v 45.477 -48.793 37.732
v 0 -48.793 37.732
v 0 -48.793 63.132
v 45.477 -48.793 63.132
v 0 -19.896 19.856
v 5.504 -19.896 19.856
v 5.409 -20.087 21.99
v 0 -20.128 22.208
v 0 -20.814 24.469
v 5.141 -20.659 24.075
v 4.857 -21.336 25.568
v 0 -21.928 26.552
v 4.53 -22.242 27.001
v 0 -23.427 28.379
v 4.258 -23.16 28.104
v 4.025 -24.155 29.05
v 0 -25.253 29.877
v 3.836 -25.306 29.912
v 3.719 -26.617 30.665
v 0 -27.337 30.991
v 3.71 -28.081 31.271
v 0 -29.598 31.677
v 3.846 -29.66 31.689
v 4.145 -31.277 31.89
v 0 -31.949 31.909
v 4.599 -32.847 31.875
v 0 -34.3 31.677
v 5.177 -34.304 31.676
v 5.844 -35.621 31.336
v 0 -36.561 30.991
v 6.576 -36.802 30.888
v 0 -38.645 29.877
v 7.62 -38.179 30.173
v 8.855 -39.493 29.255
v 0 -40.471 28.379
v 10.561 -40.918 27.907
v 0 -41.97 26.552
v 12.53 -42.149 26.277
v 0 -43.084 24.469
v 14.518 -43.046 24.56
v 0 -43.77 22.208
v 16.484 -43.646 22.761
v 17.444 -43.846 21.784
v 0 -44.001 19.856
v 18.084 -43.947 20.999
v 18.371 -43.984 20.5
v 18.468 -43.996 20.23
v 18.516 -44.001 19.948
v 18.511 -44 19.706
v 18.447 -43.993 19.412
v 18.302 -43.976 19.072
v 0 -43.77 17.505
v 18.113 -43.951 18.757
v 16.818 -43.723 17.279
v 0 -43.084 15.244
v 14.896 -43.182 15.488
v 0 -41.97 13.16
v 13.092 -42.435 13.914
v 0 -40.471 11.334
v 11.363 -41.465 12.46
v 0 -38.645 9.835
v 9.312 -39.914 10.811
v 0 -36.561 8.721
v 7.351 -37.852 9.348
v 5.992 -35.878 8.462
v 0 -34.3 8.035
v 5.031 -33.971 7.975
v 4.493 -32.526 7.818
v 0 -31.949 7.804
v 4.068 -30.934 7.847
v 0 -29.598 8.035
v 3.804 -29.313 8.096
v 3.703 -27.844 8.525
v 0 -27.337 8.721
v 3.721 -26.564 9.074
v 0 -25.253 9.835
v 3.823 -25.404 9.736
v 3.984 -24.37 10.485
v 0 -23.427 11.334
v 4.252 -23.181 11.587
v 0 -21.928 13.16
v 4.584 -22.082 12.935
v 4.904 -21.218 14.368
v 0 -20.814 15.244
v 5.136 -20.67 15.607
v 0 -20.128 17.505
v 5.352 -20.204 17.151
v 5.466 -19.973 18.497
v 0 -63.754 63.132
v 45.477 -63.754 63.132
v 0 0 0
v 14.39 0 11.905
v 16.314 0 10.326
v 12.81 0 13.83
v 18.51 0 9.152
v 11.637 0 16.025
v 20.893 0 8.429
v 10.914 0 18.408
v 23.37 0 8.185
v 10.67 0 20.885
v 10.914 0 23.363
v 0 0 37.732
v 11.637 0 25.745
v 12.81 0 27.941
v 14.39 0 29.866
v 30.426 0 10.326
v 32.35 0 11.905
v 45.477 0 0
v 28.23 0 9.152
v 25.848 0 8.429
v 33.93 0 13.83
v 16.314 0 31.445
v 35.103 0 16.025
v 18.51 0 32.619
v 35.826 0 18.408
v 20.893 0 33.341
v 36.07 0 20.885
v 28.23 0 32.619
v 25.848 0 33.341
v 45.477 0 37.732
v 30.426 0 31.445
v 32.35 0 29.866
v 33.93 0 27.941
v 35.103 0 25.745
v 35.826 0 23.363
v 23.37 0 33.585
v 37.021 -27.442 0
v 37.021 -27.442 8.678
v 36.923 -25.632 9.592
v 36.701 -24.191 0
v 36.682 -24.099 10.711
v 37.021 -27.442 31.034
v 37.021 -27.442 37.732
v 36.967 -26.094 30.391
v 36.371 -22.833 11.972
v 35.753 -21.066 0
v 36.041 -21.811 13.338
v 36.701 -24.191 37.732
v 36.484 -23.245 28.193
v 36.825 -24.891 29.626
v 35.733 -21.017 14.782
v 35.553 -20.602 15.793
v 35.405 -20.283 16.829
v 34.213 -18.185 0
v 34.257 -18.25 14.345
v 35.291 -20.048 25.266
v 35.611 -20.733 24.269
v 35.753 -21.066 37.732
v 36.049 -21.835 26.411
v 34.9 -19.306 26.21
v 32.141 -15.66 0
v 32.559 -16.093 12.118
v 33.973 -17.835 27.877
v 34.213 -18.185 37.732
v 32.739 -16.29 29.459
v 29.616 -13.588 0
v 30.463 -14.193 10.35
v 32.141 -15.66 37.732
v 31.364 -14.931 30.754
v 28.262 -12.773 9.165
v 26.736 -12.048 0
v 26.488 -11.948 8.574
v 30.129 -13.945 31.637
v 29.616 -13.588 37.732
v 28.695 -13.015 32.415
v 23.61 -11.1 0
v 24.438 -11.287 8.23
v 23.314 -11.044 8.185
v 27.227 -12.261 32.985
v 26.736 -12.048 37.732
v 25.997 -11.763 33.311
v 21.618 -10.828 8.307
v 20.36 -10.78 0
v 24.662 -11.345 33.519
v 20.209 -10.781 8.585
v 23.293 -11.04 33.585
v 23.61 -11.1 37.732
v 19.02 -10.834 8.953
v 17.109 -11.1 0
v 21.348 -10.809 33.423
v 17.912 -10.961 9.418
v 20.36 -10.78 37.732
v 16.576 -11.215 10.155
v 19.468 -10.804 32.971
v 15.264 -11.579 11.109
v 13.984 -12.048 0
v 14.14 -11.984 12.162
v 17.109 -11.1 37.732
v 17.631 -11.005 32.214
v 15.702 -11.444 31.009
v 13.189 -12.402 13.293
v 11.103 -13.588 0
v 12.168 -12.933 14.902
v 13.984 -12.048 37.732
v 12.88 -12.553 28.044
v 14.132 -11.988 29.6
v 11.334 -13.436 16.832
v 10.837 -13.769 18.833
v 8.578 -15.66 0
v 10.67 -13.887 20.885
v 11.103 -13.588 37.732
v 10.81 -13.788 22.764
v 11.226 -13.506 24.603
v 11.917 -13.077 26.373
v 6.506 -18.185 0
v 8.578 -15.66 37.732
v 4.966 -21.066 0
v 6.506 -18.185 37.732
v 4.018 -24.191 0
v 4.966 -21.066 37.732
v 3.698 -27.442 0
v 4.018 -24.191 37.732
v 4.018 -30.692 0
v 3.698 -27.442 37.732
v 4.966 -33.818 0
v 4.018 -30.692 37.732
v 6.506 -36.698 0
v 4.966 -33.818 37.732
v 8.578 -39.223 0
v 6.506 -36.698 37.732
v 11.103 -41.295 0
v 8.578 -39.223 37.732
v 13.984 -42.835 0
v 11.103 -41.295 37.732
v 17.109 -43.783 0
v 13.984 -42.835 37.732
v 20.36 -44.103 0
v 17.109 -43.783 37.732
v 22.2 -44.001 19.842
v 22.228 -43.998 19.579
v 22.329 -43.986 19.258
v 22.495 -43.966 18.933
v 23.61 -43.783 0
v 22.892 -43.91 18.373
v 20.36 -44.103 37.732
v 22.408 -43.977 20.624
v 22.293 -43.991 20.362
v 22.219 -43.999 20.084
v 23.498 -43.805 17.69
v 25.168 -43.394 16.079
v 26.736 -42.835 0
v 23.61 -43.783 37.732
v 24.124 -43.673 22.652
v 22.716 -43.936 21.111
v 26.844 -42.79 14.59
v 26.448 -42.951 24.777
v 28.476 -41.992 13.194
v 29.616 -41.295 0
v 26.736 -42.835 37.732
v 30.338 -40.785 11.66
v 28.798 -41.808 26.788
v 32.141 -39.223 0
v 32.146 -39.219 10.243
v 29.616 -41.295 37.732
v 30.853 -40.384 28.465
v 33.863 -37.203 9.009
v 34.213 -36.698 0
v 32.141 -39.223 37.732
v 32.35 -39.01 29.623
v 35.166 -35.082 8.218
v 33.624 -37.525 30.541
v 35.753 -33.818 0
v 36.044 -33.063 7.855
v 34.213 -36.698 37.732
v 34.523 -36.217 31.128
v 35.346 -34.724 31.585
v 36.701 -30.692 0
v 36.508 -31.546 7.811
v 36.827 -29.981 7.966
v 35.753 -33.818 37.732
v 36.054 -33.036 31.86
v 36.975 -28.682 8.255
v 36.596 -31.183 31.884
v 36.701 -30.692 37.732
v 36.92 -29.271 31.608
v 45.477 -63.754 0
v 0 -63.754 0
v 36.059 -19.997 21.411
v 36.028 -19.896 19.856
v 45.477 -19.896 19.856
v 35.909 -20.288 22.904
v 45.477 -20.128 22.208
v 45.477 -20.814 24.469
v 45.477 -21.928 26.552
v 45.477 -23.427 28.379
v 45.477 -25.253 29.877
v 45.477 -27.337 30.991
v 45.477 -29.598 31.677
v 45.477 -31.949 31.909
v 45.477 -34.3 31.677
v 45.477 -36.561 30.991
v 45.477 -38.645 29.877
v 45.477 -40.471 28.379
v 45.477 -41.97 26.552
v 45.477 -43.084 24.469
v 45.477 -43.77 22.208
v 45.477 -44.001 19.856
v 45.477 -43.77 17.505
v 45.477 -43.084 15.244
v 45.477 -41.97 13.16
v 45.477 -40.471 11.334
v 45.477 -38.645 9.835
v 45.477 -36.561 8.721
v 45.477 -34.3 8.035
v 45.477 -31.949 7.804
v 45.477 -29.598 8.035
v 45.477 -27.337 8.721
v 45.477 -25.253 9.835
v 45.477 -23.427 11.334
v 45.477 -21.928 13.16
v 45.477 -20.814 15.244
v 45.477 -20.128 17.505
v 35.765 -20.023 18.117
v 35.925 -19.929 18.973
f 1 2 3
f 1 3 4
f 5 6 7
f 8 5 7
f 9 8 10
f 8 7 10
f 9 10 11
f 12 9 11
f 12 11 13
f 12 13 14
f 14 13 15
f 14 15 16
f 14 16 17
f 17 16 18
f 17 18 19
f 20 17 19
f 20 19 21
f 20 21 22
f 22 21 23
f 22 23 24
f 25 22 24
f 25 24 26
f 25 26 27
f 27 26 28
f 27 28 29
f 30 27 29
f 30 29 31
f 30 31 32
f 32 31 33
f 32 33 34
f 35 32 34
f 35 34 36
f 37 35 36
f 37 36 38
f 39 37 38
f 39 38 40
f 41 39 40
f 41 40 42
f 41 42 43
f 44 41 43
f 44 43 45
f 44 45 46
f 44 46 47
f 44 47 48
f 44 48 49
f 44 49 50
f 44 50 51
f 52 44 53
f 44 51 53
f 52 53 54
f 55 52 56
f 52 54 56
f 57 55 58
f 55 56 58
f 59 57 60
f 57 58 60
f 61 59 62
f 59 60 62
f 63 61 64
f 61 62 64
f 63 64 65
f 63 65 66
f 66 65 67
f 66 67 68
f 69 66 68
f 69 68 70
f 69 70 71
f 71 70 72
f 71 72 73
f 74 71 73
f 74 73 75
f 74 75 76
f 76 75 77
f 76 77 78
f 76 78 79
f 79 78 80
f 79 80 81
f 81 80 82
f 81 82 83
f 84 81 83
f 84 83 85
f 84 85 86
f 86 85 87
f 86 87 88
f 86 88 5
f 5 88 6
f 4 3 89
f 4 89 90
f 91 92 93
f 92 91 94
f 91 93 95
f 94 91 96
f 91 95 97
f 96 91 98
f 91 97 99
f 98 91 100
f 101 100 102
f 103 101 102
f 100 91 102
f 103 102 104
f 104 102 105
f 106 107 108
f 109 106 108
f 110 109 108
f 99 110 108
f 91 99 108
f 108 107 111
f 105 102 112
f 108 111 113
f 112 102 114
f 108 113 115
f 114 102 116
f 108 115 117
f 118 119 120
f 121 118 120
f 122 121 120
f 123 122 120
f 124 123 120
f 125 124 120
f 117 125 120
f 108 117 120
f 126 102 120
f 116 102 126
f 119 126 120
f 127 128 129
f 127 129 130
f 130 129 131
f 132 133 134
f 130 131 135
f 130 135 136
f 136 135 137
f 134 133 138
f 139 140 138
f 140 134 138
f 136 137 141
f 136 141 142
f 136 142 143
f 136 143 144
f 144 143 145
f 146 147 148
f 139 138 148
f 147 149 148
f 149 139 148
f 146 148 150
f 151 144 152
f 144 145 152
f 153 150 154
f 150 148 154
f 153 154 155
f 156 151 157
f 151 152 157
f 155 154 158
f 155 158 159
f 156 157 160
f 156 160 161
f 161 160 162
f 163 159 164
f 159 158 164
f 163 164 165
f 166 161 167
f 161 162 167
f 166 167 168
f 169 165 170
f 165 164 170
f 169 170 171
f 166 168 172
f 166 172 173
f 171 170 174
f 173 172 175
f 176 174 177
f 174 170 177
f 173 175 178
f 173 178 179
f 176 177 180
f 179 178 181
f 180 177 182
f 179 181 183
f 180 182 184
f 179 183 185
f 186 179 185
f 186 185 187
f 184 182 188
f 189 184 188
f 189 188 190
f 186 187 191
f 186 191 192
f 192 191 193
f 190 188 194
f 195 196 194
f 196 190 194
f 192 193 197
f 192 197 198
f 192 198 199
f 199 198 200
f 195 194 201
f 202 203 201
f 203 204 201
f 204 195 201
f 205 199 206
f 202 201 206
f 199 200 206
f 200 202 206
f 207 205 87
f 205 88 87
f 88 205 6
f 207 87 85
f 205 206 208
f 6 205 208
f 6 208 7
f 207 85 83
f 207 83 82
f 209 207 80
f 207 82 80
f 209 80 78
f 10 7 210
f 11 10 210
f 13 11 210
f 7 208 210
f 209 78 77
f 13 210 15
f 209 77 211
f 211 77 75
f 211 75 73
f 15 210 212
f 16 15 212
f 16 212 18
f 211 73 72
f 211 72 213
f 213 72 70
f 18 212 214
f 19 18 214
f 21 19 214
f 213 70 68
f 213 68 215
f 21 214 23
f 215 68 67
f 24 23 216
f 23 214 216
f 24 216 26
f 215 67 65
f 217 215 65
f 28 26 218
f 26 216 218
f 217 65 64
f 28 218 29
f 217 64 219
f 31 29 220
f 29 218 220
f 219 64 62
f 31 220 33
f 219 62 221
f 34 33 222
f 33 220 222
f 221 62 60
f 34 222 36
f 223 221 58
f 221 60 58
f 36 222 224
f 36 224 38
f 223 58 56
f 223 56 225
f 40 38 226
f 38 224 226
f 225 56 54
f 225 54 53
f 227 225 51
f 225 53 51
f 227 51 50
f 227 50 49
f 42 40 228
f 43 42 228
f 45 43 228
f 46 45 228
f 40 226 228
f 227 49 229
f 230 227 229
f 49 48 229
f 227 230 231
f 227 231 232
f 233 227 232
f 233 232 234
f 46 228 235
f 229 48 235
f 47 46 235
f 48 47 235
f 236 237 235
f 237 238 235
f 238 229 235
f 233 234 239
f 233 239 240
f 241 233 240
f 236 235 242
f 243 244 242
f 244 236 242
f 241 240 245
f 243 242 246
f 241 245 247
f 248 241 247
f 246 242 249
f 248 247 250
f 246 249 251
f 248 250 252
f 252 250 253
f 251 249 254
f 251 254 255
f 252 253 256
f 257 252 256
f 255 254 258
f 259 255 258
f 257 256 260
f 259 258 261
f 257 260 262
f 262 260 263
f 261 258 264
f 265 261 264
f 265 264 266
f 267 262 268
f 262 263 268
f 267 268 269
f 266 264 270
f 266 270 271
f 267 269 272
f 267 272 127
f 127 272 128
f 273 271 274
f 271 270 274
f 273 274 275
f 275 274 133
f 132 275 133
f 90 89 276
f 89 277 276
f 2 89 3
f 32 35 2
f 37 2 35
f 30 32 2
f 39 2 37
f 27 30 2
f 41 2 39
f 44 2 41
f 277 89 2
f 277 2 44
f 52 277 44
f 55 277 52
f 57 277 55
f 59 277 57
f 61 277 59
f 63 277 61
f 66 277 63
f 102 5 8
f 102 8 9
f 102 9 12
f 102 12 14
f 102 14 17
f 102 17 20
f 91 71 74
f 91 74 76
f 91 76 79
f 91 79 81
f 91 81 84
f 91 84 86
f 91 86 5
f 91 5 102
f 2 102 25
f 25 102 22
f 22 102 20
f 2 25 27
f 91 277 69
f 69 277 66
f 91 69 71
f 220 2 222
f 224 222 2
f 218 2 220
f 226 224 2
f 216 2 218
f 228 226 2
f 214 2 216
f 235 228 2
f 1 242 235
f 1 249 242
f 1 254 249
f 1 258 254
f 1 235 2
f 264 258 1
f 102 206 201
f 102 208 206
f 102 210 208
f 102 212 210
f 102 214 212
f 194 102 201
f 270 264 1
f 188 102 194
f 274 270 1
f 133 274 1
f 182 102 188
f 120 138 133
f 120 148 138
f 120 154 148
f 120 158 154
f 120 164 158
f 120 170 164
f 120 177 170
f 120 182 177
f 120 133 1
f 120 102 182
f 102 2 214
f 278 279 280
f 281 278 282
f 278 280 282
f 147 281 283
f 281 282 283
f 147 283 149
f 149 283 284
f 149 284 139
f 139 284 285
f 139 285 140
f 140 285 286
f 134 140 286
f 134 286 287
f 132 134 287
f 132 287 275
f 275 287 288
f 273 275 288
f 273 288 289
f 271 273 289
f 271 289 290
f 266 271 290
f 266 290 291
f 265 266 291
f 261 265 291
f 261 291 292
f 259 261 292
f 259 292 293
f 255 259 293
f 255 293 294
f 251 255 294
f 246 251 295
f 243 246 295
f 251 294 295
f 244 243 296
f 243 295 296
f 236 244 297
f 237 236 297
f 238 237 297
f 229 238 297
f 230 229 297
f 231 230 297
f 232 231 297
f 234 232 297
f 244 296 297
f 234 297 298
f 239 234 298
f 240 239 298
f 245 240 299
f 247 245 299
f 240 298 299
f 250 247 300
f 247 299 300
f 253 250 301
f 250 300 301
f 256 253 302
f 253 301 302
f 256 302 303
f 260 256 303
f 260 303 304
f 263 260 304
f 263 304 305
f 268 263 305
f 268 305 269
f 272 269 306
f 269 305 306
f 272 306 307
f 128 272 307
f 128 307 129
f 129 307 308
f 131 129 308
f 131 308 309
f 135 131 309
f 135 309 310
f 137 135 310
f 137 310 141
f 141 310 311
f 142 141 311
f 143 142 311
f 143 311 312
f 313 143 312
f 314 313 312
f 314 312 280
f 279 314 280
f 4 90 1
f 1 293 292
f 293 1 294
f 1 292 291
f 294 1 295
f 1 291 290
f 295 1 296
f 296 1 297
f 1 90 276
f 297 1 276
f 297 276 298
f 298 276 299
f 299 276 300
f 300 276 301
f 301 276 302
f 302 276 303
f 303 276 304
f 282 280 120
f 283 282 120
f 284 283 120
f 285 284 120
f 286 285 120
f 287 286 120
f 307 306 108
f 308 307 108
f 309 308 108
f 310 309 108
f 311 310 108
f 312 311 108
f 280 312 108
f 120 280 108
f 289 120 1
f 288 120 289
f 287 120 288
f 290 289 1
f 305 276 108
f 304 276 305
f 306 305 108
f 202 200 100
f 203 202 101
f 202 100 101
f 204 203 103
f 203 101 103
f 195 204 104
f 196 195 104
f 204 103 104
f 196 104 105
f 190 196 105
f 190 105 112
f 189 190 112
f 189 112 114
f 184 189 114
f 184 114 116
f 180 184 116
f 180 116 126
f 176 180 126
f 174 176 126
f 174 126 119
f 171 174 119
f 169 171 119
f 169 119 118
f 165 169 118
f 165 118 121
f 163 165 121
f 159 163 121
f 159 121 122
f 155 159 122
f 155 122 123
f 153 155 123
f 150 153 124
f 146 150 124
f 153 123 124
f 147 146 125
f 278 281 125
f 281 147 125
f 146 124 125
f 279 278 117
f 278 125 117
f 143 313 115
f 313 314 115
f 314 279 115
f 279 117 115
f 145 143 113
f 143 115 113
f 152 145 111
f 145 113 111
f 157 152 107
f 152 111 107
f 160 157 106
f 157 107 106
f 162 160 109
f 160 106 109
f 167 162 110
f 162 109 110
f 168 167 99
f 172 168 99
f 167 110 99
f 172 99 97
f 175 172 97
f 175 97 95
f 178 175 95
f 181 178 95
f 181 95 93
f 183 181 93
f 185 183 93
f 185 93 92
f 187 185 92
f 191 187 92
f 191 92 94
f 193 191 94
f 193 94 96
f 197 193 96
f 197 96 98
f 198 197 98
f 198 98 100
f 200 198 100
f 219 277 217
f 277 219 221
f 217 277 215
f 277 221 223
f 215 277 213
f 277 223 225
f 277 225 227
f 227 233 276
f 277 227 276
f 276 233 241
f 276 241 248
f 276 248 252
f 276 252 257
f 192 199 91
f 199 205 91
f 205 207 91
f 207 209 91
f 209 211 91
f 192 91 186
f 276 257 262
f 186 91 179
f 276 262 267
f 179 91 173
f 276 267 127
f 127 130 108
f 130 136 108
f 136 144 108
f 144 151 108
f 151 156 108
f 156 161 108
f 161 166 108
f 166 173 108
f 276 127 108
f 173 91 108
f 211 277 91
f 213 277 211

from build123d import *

# Parameters (mm, degrees)
F0_W      = 45.4768538475
F0_H      = 37.7318039536
F1_DEPTH  = 63.754
F2_R      = 16.6615499076
F3_DEPTH  = 75.184
F4_W      = 45.4768538475
F4_H      = 14.9607213655
F5_DEPTH  = 25.4
F8_R      = 12.0524100186
F10_DEPTH = 59.436
F11_R     = 12.7
F12_DEPTH = 25.4


# Not quite as in the source:
# - the program builds the solid bodies; features that only make, move or delete a surface that nothing else refers to are left out


with BuildPart() as f1:
    # F0 (on Front) → F1 (new body)
    with BuildSketch(Plane.XZ):
        with Locations((22.7384269238, 18.8659019768)):
            Rectangle(F0_W, F0_H)
    extrude(amount=F1_DEPTH)

    # F2 (on face) → F3 (cut)
    with BuildSketch(Plane.XY.offset(37.7318039536)):
        with Locations((20.3596297652, -27.4416878819)):
            Circle(F2_R)
    extrude(amount=-F3_DEPTH, mode=Mode.SUBTRACT)

    # F4 (on face) → F5 (join)
    with BuildSketch(Plane.XY.offset(37.7318039536)):
        with Locations((22.7384269238, -56.2736393173)):
            Rectangle(F4_W, F4_H)
    extrude(amount=F5_DEPTH)

    # F8 (on face) → F10 (cut)
    with BuildSketch(Plane.YZ.offset(45.4768538475)):
        with Locations((-31.9488979876, 19.8562797159)):
            Circle(F8_R)
    extrude(amount=-F10_DEPTH, mode=Mode.SUBTRACT)

    # F11 (on face) → F12 (cut)
    with BuildSketch(Plane(origin=(0, 0, 0), x_dir=(-1, 0, 0), z_dir=(0, 1, 0))):
        with Locations((-23.3701635152, 20.8852831274)):
            Circle(F11_R)
    extrude(amount=-F12_DEPTH, mode=Mode.SUBTRACT)


solid = f1.part
